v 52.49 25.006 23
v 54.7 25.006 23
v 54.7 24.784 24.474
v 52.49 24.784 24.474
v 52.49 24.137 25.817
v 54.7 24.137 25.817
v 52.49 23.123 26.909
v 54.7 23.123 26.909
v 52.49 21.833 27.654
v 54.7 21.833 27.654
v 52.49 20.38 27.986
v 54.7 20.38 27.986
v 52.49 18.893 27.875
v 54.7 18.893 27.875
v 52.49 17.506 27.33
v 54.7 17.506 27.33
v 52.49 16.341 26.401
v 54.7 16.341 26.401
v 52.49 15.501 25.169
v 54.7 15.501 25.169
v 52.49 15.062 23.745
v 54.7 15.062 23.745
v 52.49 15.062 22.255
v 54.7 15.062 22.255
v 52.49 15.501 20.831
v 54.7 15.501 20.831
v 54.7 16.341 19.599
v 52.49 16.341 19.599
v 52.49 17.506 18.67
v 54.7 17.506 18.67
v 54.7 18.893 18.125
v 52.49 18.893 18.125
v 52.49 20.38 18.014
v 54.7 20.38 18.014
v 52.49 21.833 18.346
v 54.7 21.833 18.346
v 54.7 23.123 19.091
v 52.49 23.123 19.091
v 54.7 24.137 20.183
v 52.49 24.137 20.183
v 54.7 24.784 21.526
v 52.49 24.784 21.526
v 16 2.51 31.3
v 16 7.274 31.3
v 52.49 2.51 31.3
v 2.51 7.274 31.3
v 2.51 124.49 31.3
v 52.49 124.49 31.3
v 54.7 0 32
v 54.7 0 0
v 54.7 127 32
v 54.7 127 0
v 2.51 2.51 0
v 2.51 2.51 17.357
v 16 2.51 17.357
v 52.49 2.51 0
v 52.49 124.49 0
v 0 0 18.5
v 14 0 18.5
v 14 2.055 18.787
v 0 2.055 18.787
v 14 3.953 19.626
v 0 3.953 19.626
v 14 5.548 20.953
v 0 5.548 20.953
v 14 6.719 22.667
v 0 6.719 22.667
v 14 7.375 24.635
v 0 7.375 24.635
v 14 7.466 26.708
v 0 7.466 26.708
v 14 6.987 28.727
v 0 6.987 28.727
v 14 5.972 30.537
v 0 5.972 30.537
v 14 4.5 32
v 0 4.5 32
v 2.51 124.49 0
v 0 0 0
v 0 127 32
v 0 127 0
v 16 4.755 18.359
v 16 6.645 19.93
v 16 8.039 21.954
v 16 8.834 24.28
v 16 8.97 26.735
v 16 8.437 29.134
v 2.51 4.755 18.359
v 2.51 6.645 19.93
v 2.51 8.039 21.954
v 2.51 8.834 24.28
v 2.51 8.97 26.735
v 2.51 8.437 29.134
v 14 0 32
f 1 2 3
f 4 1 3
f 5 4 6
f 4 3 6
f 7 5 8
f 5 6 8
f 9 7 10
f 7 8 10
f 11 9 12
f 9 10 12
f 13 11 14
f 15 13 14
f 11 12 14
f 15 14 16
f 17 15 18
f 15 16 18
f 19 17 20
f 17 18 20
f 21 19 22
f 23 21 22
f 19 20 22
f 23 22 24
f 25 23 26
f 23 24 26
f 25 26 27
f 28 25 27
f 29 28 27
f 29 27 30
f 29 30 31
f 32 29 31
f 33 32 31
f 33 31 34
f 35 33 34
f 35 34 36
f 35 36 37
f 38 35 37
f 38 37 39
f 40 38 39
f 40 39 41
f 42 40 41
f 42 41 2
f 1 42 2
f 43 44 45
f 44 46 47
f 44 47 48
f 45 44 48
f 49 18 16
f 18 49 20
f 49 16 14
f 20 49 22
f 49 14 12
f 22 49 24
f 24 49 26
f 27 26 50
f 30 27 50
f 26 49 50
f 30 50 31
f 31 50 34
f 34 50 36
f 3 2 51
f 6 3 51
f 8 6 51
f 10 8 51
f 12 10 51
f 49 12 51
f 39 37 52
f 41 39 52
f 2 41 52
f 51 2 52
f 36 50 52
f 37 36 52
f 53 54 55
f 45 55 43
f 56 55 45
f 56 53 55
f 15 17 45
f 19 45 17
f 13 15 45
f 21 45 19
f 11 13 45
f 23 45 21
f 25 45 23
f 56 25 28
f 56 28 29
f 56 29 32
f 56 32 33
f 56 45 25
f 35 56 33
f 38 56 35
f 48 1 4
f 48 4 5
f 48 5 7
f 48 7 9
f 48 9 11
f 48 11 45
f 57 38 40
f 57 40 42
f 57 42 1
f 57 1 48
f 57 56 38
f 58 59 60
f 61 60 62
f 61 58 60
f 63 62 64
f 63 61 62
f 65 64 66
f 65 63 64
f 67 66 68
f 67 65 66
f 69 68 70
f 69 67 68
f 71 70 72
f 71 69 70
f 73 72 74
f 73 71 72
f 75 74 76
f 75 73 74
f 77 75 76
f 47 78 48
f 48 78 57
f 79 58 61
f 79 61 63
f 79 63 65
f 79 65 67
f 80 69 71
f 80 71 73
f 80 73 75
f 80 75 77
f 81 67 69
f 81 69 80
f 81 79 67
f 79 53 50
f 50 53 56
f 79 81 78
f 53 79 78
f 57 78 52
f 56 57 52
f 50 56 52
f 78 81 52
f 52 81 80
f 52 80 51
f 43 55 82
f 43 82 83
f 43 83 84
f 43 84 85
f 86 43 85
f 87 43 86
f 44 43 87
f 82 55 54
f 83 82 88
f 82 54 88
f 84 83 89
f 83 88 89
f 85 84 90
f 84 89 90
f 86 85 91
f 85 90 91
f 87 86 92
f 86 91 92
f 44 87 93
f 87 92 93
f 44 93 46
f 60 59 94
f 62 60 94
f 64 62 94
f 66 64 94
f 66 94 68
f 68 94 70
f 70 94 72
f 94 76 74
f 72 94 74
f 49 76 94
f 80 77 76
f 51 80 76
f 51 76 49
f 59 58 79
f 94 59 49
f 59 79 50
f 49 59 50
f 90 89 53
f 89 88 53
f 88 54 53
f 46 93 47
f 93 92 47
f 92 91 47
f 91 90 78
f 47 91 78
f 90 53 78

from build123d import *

# Parameters (mm, degrees)
SKETCH_W        = 54.7
SKETCH_H        = 127
PAD_DEPTH       = 32
SKETCH001_W     = 49.98
SKETCH001_H     = 121.98
POCKET_DEPTH    = 31.3
PAD001_DEPTH    = 16
SKETCH002_R     = 7.5
POCKET001_DEPTH = 14
SKETCH004_R     = 5
POCKET002_DEPTH = 5


with BuildPart() as part:
    # Sketch → Pad (new body)
    with BuildSketch(Plane.XY):
        with Locations((27.35, 63.5)):
            Rectangle(SKETCH_W, SKETCH_H)
    extrude(amount=PAD_DEPTH)

    # Sketch001 → Pocket (cut)
    with BuildSketch(Plane.XY):
        with Locations((27.5, 63.5)):
            Rectangle(SKETCH001_W, SKETCH001_H)
    extrude(amount=POCKET_DEPTH, mode=Mode.SUBTRACT)

    # Sketch003 → Pad001 (join)
    with BuildSketch(Plane.YZ):
        with BuildLine():
            ThreePointArc((0, 17), (8.215838, 22.325765), (6.708204, 32))
            Line((0, 32), (6.708204, 32))
            Line((0, 32), (0, 17))
        make_face()
    extrude(amount=PAD001_DEPTH)

    # Sketch002 → Pocket001 (cut)
    with BuildSketch(Plane.YZ):
        with Locations((0, 26)):
            Circle(SKETCH002_R)
    extrude(amount=POCKET001_DEPTH, mode=Mode.SUBTRACT)

    # Sketch004 (on DatumPlane) → Pocket002 (cut)
    with BuildSketch(Plane.YZ.offset(55)):
        with Locations((20.005968, 23)):
            Circle(SKETCH004_R)
    extrude(amount=-POCKET002_DEPTH, mode=Mode.SUBTRACT)


solid = part.part
